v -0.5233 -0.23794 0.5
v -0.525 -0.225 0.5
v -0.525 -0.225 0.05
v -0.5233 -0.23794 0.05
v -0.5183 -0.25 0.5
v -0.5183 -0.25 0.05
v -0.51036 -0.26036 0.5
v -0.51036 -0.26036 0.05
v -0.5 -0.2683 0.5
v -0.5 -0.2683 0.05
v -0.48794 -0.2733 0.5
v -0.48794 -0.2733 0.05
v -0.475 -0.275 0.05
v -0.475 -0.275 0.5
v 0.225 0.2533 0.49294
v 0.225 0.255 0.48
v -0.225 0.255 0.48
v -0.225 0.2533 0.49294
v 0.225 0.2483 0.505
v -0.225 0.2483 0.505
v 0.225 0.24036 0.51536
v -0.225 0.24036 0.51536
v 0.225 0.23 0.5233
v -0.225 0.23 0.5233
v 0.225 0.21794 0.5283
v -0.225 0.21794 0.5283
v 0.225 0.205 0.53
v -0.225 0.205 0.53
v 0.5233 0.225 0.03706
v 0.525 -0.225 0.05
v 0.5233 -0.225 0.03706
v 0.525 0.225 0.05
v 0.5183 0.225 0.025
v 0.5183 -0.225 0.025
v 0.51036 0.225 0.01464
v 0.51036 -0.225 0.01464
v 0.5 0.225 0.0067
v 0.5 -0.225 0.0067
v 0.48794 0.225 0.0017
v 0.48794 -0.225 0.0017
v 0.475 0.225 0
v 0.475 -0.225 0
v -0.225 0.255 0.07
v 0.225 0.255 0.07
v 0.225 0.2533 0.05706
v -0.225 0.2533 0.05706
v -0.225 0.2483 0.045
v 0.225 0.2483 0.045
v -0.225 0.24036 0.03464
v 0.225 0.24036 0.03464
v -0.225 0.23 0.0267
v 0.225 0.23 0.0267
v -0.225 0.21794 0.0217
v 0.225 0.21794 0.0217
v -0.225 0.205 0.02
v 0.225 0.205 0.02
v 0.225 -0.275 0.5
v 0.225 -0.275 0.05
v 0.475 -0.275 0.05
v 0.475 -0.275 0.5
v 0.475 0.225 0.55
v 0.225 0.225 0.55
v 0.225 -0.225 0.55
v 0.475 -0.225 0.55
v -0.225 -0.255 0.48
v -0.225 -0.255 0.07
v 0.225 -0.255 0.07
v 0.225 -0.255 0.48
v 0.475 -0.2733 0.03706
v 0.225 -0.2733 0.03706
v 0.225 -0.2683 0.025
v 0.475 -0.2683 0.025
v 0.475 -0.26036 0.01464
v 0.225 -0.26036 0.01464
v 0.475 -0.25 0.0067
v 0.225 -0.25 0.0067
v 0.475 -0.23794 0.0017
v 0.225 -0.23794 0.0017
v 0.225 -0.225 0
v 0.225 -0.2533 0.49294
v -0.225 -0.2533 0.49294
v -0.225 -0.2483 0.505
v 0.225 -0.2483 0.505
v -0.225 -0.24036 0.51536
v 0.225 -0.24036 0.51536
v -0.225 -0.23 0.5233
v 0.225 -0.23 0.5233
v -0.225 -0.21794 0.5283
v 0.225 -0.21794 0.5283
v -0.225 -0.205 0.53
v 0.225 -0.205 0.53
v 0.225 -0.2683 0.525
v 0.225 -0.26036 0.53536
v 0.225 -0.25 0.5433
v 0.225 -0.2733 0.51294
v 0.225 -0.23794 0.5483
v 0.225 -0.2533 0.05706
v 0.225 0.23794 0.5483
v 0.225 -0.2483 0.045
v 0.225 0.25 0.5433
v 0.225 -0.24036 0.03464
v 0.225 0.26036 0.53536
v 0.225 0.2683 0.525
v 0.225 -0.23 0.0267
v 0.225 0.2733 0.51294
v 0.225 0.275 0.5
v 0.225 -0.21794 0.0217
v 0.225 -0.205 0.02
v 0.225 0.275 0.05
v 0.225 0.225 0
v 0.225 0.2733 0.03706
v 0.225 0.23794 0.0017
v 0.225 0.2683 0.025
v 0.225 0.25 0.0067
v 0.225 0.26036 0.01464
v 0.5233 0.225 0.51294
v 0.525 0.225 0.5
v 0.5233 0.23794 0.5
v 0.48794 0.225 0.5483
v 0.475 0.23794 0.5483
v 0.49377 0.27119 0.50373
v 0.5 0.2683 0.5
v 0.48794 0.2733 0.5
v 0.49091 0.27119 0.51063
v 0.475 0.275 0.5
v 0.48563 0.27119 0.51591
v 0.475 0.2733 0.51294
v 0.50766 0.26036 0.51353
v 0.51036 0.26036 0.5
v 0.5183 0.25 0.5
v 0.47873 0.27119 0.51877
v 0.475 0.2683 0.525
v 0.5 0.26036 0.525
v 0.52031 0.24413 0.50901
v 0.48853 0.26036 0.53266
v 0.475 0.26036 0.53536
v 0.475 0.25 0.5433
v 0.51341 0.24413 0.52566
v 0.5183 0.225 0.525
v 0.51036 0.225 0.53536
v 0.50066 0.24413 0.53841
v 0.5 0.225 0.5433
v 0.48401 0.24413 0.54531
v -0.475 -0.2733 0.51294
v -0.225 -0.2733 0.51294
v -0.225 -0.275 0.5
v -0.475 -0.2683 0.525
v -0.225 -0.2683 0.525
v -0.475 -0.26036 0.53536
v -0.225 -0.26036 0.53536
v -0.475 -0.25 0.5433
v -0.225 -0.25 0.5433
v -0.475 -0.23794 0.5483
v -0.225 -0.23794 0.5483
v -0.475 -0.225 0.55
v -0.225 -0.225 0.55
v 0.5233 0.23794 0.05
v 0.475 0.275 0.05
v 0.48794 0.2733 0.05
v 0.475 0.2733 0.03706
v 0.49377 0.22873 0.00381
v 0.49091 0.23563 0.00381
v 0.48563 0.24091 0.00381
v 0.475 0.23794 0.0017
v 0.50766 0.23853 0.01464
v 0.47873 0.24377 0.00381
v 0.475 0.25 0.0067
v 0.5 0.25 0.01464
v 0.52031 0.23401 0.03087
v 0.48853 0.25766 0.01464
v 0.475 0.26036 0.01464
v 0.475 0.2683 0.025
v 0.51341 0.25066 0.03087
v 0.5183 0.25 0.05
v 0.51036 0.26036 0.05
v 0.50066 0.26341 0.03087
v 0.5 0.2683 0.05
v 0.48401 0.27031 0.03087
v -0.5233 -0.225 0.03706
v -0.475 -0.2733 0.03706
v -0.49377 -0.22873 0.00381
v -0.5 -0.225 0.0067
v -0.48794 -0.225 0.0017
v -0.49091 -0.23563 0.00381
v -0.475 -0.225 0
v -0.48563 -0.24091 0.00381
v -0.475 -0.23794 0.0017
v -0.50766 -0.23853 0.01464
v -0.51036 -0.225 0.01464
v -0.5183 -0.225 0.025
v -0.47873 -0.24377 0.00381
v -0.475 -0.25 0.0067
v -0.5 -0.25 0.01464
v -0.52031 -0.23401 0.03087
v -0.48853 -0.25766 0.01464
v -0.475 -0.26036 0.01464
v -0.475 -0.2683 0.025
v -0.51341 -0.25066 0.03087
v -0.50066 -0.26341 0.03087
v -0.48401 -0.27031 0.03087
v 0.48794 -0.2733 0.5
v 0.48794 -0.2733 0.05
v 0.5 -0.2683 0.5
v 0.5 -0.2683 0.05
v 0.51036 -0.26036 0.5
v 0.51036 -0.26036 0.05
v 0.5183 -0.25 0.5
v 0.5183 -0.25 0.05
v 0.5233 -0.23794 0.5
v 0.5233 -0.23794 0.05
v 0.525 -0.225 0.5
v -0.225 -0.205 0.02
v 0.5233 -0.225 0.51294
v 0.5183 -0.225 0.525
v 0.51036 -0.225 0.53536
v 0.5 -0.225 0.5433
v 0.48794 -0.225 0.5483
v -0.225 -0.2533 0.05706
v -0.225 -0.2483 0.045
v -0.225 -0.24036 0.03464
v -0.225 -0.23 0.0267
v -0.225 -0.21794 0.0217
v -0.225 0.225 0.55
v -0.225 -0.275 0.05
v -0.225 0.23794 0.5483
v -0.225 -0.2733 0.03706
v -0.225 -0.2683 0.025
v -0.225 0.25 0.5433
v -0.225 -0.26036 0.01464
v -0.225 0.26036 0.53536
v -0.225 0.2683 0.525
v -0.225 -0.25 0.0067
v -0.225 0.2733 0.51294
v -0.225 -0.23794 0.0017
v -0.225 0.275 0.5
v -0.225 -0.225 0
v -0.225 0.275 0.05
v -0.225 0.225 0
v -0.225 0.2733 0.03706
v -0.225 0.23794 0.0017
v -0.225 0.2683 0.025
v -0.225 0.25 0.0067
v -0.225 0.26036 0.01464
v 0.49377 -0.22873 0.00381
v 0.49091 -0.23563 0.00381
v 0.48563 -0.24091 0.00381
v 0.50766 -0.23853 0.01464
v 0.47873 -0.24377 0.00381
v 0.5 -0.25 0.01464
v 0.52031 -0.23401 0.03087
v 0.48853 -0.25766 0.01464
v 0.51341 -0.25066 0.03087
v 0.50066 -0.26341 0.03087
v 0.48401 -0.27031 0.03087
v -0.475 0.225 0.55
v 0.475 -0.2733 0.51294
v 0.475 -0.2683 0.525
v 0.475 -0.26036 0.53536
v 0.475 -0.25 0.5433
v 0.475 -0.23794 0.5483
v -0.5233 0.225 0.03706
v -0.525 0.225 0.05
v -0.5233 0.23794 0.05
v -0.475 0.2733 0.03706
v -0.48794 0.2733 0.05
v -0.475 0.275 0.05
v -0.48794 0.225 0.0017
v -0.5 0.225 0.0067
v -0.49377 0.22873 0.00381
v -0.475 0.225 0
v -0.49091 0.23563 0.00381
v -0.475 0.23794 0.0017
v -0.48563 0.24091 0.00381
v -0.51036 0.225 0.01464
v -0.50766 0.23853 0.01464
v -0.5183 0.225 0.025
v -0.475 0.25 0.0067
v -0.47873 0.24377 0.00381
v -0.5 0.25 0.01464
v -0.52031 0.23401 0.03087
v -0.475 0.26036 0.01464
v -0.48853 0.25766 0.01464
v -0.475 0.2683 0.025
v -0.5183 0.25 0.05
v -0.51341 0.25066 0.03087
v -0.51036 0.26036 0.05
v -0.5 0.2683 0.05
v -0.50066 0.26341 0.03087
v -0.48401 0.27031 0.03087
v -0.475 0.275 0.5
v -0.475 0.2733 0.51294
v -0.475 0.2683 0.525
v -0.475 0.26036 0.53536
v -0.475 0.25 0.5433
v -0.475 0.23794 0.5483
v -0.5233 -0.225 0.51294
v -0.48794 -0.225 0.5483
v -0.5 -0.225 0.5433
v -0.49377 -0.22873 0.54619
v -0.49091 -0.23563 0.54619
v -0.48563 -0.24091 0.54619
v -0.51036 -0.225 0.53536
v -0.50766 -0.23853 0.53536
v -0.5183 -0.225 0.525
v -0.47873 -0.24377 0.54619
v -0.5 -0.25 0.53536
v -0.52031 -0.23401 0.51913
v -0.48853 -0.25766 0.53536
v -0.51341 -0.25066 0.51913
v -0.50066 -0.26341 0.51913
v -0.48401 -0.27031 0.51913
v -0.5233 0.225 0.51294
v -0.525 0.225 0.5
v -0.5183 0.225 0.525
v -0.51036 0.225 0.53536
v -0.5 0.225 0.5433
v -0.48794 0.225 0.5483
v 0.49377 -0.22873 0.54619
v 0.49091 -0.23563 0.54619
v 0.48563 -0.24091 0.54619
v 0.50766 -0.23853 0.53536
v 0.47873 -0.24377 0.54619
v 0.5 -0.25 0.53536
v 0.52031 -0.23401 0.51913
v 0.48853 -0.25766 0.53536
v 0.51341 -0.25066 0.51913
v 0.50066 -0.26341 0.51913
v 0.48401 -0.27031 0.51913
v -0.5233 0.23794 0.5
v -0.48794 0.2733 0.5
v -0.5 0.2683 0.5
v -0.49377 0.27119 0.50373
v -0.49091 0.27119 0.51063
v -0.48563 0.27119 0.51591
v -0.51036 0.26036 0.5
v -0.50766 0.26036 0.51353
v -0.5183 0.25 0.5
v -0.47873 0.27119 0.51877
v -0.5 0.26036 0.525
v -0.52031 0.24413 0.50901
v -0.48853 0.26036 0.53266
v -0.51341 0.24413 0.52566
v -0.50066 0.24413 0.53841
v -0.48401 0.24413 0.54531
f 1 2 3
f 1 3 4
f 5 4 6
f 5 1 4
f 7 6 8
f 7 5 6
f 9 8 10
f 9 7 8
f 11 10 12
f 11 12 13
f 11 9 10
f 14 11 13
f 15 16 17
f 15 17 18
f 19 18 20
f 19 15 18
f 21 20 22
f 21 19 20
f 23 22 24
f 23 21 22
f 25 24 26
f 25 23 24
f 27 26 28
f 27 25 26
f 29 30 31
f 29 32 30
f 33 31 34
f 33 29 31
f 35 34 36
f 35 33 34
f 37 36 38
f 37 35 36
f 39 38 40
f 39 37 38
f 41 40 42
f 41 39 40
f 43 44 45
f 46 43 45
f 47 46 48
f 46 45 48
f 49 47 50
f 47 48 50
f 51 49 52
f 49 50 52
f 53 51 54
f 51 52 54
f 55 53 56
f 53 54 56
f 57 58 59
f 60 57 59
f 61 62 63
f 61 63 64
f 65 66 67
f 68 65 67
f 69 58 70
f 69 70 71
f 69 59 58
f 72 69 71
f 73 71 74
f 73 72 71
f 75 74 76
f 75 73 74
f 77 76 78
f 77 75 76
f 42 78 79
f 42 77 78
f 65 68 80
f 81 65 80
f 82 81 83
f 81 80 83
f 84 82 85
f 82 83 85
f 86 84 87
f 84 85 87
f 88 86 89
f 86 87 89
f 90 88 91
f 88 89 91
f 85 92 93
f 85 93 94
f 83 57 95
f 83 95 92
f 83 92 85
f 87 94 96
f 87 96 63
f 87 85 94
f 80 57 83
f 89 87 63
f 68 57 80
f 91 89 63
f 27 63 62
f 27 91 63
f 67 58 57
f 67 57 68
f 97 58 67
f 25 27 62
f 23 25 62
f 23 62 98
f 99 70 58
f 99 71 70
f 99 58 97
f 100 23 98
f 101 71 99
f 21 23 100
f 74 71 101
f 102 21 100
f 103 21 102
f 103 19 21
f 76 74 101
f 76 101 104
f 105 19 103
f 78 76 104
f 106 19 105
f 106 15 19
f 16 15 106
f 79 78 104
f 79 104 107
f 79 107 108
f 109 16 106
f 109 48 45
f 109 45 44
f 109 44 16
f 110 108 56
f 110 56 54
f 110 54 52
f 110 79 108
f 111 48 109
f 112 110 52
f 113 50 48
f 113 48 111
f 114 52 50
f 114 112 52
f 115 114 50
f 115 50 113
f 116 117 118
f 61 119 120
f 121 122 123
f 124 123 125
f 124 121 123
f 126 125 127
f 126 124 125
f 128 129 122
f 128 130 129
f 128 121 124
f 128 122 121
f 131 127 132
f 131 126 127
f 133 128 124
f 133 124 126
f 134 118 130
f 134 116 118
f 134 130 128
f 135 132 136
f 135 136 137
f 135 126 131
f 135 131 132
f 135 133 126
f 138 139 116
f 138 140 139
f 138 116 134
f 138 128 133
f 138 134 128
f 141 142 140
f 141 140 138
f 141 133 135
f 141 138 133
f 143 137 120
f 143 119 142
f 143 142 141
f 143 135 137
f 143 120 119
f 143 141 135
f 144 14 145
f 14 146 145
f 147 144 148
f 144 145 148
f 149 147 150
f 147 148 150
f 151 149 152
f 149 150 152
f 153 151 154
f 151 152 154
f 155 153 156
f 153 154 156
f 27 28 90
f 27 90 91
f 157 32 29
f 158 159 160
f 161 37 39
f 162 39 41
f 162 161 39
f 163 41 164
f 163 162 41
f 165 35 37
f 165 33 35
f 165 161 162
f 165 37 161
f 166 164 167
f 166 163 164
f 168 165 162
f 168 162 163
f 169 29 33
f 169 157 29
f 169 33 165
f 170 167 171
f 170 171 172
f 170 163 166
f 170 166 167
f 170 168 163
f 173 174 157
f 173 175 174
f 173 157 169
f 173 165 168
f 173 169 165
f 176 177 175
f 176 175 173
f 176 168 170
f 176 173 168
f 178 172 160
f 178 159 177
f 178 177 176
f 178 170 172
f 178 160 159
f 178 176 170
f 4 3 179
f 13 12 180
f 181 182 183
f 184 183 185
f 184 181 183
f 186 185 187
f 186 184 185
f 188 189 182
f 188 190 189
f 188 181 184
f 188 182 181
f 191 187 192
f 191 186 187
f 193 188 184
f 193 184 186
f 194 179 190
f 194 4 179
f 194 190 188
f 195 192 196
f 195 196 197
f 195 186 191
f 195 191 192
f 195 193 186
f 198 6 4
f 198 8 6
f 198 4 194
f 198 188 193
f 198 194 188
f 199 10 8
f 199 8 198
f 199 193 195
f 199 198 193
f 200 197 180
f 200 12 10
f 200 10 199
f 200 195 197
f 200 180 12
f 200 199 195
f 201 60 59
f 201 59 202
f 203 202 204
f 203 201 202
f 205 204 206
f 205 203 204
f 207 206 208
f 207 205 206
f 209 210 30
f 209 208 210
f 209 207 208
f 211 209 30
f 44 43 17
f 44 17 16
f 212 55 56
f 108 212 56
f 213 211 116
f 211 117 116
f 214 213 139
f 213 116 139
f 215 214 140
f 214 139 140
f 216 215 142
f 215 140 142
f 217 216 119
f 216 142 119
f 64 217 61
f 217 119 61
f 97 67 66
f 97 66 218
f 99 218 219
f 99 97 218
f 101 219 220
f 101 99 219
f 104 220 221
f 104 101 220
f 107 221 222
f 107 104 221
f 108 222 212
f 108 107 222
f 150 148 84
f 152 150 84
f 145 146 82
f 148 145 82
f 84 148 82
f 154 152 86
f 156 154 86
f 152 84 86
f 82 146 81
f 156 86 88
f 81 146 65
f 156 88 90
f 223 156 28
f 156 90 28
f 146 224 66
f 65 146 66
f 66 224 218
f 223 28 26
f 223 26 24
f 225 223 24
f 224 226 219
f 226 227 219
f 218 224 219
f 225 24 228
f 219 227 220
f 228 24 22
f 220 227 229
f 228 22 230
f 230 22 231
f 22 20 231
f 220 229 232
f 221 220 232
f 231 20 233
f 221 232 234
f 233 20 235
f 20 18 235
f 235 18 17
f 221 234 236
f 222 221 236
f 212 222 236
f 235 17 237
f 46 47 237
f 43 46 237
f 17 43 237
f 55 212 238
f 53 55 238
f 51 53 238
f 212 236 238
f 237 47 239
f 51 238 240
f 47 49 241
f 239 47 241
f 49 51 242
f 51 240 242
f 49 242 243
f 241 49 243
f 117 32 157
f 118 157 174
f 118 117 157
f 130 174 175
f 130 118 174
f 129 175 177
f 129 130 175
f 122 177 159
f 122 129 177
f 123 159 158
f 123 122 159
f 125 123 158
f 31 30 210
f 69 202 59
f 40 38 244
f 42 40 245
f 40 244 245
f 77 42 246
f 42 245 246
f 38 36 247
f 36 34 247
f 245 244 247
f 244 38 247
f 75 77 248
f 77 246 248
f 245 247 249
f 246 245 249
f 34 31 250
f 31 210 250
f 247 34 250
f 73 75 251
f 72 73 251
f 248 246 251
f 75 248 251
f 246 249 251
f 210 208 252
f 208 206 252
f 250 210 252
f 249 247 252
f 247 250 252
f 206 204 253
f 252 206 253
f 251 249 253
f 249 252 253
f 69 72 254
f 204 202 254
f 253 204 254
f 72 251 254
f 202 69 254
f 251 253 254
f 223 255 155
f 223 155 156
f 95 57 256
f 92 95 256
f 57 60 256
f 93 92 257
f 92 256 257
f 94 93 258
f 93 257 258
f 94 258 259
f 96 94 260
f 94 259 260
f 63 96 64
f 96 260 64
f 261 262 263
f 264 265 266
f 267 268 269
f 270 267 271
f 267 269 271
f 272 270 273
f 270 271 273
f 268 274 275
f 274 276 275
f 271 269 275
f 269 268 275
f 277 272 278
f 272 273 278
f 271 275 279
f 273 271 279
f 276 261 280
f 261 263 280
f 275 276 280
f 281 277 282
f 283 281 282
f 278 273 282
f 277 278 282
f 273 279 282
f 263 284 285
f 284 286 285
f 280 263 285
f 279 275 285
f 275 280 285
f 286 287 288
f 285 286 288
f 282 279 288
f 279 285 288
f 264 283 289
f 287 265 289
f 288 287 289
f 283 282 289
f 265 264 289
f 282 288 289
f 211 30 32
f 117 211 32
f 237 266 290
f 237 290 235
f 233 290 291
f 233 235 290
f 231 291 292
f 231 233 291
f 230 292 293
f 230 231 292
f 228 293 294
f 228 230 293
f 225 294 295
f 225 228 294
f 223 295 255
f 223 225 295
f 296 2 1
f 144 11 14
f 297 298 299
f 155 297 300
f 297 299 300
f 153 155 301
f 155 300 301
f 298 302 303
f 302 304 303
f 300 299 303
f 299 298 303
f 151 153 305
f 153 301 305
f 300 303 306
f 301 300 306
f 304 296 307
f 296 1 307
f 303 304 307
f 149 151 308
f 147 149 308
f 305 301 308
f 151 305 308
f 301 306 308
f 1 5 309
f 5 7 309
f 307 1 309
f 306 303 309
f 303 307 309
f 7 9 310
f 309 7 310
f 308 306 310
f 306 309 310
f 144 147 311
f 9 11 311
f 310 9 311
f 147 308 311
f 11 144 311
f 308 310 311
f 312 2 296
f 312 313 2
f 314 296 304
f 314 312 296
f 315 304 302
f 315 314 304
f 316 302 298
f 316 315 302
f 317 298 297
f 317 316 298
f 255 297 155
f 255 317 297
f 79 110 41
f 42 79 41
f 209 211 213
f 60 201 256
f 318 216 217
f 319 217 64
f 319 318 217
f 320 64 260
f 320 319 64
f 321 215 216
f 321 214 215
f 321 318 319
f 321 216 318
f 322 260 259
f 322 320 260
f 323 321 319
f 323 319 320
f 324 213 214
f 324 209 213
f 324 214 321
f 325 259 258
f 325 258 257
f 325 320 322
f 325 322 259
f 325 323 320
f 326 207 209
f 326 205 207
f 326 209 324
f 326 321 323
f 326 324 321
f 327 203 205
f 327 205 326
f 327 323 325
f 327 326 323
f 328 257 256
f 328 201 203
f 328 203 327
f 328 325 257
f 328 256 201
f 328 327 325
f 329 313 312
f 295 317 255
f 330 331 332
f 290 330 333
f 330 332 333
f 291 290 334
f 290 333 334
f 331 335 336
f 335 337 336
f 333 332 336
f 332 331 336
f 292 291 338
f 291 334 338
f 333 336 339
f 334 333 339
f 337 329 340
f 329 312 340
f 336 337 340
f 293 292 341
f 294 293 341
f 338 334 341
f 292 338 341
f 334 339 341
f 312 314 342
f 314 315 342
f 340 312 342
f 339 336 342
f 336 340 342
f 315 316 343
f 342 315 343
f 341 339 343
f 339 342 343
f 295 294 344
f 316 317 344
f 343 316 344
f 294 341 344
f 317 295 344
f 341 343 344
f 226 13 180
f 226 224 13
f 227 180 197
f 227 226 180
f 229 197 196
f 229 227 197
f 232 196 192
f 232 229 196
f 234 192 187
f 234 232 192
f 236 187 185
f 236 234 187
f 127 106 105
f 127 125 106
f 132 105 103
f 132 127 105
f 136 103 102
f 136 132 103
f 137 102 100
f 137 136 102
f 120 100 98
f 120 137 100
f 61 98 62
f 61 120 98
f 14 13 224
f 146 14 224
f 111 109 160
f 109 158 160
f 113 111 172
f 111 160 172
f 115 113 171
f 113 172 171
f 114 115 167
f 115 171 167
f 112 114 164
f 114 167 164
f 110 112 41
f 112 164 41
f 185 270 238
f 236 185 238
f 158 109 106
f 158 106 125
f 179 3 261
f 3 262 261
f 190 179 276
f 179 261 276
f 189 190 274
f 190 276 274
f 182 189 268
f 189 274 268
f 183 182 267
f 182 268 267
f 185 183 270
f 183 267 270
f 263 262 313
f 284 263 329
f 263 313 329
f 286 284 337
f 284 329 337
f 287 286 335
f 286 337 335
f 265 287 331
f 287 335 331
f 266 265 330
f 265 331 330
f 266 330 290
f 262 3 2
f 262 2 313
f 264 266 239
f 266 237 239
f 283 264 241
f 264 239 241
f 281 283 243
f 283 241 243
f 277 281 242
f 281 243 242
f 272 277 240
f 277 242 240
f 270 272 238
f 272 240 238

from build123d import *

# Parameters (mm, degrees)
PLATING_LEFT_W      = 0.3
PLATING_LEFT_H      = 0.55
PLATING_LEFT_DEPTH  = 0.55
PLATING_LEFT_F_R    = 0.05
PLATING_RIGHT_W     = 0.3
PLATING_RIGHT_H     = 0.55
PLATING_RIGHT_DEPTH = 0.55
PLATING_RIGHT_F_R   = 0.05
CHIP_W              = 1.01
CHIP_H              = 0.51
CHIP_DEPTH          = 0.51
CHIP_F_R            = 0.05


with BuildPart() as plating_left_f:
    # plating_left → plating_left (new body)
    with BuildSketch(Plane(origin=(-0.525, -0.275, 0), x_dir=(1, 0, 0), z_dir=(0, 0, 1))):
        with Locations((0.15, 0.275)):
            Rectangle(PLATING_LEFT_W, PLATING_LEFT_H)
    extrude(amount=PLATING_LEFT_DEPTH)

    # plating_left_f
    plating_left_f_edges = [plating_left_f.edges().sort_by_distance(p)[0] for p in [
        (-0.525, -0.275, 0.275),
        (-0.525, 0, 0.55),
        (-0.525, 0.275, 0.275),
        (-0.525, 0, 0),
        (-0.375, -0.275, 0),
        (-0.375, -0.275, 0.55),
        (-0.375, 0.275, 0),
        (-0.375, 0.275, 0.55),
    ]]
    fillet(plating_left_f_edges, radius=PLATING_LEFT_F_R)


with BuildPart() as plating_right_f:
    # plating_right → plating_right (new body)
    with BuildSketch(Plane(origin=(0.225, -0.275, 0), x_dir=(1, 0, 0), z_dir=(0, 0, 1))):
        with Locations((0.15, 0.275)):
            Rectangle(PLATING_RIGHT_W, PLATING_RIGHT_H)
    extrude(amount=PLATING_RIGHT_DEPTH)

    # plating_right_f
    plating_right_f_edges = [plating_right_f.edges().sort_by_distance(p)[0] for p in [
        (0.525, -0.275, 0.275),
        (0.525, 0, 0.55),
        (0.525, 0.275, 0.275),
        (0.525, 0, 0),
        (0.375, -0.275, 0),
        (0.375, -0.275, 0.55),
        (0.375, 0.275, 0),
        (0.375, 0.275, 0.55),
    ]]
    fillet(plating_right_f_edges, radius=PLATING_RIGHT_F_R)


with BuildPart() as capacitor:
    # chip → chip (new body)
    with BuildSketch(Plane(origin=(-0.505, -0.255, 0.02), x_dir=(1, 0, 0), z_dir=(0, 0, 1))):
        with Locations((0.505, 0.255)):
            Rectangle(CHIP_W, CHIP_H)
    extrude(amount=CHIP_DEPTH)

    # chip_f
    chip_f_edges = [capacitor.edges().sort_by_distance(p)[0] for p in [
        (0, -0.255, 0.02),
        (0, -0.255, 0.53),
        (0, 0.255, 0.02),
        (0, 0.255, 0.53),
    ]]
    fillet(chip_f_edges, radius=CHIP_F_R)

    # capacitor: union plating_left_f, plating_right_f
    add(plating_left_f.part)
    add(plating_right_f.part)


solid = capacitor.part
